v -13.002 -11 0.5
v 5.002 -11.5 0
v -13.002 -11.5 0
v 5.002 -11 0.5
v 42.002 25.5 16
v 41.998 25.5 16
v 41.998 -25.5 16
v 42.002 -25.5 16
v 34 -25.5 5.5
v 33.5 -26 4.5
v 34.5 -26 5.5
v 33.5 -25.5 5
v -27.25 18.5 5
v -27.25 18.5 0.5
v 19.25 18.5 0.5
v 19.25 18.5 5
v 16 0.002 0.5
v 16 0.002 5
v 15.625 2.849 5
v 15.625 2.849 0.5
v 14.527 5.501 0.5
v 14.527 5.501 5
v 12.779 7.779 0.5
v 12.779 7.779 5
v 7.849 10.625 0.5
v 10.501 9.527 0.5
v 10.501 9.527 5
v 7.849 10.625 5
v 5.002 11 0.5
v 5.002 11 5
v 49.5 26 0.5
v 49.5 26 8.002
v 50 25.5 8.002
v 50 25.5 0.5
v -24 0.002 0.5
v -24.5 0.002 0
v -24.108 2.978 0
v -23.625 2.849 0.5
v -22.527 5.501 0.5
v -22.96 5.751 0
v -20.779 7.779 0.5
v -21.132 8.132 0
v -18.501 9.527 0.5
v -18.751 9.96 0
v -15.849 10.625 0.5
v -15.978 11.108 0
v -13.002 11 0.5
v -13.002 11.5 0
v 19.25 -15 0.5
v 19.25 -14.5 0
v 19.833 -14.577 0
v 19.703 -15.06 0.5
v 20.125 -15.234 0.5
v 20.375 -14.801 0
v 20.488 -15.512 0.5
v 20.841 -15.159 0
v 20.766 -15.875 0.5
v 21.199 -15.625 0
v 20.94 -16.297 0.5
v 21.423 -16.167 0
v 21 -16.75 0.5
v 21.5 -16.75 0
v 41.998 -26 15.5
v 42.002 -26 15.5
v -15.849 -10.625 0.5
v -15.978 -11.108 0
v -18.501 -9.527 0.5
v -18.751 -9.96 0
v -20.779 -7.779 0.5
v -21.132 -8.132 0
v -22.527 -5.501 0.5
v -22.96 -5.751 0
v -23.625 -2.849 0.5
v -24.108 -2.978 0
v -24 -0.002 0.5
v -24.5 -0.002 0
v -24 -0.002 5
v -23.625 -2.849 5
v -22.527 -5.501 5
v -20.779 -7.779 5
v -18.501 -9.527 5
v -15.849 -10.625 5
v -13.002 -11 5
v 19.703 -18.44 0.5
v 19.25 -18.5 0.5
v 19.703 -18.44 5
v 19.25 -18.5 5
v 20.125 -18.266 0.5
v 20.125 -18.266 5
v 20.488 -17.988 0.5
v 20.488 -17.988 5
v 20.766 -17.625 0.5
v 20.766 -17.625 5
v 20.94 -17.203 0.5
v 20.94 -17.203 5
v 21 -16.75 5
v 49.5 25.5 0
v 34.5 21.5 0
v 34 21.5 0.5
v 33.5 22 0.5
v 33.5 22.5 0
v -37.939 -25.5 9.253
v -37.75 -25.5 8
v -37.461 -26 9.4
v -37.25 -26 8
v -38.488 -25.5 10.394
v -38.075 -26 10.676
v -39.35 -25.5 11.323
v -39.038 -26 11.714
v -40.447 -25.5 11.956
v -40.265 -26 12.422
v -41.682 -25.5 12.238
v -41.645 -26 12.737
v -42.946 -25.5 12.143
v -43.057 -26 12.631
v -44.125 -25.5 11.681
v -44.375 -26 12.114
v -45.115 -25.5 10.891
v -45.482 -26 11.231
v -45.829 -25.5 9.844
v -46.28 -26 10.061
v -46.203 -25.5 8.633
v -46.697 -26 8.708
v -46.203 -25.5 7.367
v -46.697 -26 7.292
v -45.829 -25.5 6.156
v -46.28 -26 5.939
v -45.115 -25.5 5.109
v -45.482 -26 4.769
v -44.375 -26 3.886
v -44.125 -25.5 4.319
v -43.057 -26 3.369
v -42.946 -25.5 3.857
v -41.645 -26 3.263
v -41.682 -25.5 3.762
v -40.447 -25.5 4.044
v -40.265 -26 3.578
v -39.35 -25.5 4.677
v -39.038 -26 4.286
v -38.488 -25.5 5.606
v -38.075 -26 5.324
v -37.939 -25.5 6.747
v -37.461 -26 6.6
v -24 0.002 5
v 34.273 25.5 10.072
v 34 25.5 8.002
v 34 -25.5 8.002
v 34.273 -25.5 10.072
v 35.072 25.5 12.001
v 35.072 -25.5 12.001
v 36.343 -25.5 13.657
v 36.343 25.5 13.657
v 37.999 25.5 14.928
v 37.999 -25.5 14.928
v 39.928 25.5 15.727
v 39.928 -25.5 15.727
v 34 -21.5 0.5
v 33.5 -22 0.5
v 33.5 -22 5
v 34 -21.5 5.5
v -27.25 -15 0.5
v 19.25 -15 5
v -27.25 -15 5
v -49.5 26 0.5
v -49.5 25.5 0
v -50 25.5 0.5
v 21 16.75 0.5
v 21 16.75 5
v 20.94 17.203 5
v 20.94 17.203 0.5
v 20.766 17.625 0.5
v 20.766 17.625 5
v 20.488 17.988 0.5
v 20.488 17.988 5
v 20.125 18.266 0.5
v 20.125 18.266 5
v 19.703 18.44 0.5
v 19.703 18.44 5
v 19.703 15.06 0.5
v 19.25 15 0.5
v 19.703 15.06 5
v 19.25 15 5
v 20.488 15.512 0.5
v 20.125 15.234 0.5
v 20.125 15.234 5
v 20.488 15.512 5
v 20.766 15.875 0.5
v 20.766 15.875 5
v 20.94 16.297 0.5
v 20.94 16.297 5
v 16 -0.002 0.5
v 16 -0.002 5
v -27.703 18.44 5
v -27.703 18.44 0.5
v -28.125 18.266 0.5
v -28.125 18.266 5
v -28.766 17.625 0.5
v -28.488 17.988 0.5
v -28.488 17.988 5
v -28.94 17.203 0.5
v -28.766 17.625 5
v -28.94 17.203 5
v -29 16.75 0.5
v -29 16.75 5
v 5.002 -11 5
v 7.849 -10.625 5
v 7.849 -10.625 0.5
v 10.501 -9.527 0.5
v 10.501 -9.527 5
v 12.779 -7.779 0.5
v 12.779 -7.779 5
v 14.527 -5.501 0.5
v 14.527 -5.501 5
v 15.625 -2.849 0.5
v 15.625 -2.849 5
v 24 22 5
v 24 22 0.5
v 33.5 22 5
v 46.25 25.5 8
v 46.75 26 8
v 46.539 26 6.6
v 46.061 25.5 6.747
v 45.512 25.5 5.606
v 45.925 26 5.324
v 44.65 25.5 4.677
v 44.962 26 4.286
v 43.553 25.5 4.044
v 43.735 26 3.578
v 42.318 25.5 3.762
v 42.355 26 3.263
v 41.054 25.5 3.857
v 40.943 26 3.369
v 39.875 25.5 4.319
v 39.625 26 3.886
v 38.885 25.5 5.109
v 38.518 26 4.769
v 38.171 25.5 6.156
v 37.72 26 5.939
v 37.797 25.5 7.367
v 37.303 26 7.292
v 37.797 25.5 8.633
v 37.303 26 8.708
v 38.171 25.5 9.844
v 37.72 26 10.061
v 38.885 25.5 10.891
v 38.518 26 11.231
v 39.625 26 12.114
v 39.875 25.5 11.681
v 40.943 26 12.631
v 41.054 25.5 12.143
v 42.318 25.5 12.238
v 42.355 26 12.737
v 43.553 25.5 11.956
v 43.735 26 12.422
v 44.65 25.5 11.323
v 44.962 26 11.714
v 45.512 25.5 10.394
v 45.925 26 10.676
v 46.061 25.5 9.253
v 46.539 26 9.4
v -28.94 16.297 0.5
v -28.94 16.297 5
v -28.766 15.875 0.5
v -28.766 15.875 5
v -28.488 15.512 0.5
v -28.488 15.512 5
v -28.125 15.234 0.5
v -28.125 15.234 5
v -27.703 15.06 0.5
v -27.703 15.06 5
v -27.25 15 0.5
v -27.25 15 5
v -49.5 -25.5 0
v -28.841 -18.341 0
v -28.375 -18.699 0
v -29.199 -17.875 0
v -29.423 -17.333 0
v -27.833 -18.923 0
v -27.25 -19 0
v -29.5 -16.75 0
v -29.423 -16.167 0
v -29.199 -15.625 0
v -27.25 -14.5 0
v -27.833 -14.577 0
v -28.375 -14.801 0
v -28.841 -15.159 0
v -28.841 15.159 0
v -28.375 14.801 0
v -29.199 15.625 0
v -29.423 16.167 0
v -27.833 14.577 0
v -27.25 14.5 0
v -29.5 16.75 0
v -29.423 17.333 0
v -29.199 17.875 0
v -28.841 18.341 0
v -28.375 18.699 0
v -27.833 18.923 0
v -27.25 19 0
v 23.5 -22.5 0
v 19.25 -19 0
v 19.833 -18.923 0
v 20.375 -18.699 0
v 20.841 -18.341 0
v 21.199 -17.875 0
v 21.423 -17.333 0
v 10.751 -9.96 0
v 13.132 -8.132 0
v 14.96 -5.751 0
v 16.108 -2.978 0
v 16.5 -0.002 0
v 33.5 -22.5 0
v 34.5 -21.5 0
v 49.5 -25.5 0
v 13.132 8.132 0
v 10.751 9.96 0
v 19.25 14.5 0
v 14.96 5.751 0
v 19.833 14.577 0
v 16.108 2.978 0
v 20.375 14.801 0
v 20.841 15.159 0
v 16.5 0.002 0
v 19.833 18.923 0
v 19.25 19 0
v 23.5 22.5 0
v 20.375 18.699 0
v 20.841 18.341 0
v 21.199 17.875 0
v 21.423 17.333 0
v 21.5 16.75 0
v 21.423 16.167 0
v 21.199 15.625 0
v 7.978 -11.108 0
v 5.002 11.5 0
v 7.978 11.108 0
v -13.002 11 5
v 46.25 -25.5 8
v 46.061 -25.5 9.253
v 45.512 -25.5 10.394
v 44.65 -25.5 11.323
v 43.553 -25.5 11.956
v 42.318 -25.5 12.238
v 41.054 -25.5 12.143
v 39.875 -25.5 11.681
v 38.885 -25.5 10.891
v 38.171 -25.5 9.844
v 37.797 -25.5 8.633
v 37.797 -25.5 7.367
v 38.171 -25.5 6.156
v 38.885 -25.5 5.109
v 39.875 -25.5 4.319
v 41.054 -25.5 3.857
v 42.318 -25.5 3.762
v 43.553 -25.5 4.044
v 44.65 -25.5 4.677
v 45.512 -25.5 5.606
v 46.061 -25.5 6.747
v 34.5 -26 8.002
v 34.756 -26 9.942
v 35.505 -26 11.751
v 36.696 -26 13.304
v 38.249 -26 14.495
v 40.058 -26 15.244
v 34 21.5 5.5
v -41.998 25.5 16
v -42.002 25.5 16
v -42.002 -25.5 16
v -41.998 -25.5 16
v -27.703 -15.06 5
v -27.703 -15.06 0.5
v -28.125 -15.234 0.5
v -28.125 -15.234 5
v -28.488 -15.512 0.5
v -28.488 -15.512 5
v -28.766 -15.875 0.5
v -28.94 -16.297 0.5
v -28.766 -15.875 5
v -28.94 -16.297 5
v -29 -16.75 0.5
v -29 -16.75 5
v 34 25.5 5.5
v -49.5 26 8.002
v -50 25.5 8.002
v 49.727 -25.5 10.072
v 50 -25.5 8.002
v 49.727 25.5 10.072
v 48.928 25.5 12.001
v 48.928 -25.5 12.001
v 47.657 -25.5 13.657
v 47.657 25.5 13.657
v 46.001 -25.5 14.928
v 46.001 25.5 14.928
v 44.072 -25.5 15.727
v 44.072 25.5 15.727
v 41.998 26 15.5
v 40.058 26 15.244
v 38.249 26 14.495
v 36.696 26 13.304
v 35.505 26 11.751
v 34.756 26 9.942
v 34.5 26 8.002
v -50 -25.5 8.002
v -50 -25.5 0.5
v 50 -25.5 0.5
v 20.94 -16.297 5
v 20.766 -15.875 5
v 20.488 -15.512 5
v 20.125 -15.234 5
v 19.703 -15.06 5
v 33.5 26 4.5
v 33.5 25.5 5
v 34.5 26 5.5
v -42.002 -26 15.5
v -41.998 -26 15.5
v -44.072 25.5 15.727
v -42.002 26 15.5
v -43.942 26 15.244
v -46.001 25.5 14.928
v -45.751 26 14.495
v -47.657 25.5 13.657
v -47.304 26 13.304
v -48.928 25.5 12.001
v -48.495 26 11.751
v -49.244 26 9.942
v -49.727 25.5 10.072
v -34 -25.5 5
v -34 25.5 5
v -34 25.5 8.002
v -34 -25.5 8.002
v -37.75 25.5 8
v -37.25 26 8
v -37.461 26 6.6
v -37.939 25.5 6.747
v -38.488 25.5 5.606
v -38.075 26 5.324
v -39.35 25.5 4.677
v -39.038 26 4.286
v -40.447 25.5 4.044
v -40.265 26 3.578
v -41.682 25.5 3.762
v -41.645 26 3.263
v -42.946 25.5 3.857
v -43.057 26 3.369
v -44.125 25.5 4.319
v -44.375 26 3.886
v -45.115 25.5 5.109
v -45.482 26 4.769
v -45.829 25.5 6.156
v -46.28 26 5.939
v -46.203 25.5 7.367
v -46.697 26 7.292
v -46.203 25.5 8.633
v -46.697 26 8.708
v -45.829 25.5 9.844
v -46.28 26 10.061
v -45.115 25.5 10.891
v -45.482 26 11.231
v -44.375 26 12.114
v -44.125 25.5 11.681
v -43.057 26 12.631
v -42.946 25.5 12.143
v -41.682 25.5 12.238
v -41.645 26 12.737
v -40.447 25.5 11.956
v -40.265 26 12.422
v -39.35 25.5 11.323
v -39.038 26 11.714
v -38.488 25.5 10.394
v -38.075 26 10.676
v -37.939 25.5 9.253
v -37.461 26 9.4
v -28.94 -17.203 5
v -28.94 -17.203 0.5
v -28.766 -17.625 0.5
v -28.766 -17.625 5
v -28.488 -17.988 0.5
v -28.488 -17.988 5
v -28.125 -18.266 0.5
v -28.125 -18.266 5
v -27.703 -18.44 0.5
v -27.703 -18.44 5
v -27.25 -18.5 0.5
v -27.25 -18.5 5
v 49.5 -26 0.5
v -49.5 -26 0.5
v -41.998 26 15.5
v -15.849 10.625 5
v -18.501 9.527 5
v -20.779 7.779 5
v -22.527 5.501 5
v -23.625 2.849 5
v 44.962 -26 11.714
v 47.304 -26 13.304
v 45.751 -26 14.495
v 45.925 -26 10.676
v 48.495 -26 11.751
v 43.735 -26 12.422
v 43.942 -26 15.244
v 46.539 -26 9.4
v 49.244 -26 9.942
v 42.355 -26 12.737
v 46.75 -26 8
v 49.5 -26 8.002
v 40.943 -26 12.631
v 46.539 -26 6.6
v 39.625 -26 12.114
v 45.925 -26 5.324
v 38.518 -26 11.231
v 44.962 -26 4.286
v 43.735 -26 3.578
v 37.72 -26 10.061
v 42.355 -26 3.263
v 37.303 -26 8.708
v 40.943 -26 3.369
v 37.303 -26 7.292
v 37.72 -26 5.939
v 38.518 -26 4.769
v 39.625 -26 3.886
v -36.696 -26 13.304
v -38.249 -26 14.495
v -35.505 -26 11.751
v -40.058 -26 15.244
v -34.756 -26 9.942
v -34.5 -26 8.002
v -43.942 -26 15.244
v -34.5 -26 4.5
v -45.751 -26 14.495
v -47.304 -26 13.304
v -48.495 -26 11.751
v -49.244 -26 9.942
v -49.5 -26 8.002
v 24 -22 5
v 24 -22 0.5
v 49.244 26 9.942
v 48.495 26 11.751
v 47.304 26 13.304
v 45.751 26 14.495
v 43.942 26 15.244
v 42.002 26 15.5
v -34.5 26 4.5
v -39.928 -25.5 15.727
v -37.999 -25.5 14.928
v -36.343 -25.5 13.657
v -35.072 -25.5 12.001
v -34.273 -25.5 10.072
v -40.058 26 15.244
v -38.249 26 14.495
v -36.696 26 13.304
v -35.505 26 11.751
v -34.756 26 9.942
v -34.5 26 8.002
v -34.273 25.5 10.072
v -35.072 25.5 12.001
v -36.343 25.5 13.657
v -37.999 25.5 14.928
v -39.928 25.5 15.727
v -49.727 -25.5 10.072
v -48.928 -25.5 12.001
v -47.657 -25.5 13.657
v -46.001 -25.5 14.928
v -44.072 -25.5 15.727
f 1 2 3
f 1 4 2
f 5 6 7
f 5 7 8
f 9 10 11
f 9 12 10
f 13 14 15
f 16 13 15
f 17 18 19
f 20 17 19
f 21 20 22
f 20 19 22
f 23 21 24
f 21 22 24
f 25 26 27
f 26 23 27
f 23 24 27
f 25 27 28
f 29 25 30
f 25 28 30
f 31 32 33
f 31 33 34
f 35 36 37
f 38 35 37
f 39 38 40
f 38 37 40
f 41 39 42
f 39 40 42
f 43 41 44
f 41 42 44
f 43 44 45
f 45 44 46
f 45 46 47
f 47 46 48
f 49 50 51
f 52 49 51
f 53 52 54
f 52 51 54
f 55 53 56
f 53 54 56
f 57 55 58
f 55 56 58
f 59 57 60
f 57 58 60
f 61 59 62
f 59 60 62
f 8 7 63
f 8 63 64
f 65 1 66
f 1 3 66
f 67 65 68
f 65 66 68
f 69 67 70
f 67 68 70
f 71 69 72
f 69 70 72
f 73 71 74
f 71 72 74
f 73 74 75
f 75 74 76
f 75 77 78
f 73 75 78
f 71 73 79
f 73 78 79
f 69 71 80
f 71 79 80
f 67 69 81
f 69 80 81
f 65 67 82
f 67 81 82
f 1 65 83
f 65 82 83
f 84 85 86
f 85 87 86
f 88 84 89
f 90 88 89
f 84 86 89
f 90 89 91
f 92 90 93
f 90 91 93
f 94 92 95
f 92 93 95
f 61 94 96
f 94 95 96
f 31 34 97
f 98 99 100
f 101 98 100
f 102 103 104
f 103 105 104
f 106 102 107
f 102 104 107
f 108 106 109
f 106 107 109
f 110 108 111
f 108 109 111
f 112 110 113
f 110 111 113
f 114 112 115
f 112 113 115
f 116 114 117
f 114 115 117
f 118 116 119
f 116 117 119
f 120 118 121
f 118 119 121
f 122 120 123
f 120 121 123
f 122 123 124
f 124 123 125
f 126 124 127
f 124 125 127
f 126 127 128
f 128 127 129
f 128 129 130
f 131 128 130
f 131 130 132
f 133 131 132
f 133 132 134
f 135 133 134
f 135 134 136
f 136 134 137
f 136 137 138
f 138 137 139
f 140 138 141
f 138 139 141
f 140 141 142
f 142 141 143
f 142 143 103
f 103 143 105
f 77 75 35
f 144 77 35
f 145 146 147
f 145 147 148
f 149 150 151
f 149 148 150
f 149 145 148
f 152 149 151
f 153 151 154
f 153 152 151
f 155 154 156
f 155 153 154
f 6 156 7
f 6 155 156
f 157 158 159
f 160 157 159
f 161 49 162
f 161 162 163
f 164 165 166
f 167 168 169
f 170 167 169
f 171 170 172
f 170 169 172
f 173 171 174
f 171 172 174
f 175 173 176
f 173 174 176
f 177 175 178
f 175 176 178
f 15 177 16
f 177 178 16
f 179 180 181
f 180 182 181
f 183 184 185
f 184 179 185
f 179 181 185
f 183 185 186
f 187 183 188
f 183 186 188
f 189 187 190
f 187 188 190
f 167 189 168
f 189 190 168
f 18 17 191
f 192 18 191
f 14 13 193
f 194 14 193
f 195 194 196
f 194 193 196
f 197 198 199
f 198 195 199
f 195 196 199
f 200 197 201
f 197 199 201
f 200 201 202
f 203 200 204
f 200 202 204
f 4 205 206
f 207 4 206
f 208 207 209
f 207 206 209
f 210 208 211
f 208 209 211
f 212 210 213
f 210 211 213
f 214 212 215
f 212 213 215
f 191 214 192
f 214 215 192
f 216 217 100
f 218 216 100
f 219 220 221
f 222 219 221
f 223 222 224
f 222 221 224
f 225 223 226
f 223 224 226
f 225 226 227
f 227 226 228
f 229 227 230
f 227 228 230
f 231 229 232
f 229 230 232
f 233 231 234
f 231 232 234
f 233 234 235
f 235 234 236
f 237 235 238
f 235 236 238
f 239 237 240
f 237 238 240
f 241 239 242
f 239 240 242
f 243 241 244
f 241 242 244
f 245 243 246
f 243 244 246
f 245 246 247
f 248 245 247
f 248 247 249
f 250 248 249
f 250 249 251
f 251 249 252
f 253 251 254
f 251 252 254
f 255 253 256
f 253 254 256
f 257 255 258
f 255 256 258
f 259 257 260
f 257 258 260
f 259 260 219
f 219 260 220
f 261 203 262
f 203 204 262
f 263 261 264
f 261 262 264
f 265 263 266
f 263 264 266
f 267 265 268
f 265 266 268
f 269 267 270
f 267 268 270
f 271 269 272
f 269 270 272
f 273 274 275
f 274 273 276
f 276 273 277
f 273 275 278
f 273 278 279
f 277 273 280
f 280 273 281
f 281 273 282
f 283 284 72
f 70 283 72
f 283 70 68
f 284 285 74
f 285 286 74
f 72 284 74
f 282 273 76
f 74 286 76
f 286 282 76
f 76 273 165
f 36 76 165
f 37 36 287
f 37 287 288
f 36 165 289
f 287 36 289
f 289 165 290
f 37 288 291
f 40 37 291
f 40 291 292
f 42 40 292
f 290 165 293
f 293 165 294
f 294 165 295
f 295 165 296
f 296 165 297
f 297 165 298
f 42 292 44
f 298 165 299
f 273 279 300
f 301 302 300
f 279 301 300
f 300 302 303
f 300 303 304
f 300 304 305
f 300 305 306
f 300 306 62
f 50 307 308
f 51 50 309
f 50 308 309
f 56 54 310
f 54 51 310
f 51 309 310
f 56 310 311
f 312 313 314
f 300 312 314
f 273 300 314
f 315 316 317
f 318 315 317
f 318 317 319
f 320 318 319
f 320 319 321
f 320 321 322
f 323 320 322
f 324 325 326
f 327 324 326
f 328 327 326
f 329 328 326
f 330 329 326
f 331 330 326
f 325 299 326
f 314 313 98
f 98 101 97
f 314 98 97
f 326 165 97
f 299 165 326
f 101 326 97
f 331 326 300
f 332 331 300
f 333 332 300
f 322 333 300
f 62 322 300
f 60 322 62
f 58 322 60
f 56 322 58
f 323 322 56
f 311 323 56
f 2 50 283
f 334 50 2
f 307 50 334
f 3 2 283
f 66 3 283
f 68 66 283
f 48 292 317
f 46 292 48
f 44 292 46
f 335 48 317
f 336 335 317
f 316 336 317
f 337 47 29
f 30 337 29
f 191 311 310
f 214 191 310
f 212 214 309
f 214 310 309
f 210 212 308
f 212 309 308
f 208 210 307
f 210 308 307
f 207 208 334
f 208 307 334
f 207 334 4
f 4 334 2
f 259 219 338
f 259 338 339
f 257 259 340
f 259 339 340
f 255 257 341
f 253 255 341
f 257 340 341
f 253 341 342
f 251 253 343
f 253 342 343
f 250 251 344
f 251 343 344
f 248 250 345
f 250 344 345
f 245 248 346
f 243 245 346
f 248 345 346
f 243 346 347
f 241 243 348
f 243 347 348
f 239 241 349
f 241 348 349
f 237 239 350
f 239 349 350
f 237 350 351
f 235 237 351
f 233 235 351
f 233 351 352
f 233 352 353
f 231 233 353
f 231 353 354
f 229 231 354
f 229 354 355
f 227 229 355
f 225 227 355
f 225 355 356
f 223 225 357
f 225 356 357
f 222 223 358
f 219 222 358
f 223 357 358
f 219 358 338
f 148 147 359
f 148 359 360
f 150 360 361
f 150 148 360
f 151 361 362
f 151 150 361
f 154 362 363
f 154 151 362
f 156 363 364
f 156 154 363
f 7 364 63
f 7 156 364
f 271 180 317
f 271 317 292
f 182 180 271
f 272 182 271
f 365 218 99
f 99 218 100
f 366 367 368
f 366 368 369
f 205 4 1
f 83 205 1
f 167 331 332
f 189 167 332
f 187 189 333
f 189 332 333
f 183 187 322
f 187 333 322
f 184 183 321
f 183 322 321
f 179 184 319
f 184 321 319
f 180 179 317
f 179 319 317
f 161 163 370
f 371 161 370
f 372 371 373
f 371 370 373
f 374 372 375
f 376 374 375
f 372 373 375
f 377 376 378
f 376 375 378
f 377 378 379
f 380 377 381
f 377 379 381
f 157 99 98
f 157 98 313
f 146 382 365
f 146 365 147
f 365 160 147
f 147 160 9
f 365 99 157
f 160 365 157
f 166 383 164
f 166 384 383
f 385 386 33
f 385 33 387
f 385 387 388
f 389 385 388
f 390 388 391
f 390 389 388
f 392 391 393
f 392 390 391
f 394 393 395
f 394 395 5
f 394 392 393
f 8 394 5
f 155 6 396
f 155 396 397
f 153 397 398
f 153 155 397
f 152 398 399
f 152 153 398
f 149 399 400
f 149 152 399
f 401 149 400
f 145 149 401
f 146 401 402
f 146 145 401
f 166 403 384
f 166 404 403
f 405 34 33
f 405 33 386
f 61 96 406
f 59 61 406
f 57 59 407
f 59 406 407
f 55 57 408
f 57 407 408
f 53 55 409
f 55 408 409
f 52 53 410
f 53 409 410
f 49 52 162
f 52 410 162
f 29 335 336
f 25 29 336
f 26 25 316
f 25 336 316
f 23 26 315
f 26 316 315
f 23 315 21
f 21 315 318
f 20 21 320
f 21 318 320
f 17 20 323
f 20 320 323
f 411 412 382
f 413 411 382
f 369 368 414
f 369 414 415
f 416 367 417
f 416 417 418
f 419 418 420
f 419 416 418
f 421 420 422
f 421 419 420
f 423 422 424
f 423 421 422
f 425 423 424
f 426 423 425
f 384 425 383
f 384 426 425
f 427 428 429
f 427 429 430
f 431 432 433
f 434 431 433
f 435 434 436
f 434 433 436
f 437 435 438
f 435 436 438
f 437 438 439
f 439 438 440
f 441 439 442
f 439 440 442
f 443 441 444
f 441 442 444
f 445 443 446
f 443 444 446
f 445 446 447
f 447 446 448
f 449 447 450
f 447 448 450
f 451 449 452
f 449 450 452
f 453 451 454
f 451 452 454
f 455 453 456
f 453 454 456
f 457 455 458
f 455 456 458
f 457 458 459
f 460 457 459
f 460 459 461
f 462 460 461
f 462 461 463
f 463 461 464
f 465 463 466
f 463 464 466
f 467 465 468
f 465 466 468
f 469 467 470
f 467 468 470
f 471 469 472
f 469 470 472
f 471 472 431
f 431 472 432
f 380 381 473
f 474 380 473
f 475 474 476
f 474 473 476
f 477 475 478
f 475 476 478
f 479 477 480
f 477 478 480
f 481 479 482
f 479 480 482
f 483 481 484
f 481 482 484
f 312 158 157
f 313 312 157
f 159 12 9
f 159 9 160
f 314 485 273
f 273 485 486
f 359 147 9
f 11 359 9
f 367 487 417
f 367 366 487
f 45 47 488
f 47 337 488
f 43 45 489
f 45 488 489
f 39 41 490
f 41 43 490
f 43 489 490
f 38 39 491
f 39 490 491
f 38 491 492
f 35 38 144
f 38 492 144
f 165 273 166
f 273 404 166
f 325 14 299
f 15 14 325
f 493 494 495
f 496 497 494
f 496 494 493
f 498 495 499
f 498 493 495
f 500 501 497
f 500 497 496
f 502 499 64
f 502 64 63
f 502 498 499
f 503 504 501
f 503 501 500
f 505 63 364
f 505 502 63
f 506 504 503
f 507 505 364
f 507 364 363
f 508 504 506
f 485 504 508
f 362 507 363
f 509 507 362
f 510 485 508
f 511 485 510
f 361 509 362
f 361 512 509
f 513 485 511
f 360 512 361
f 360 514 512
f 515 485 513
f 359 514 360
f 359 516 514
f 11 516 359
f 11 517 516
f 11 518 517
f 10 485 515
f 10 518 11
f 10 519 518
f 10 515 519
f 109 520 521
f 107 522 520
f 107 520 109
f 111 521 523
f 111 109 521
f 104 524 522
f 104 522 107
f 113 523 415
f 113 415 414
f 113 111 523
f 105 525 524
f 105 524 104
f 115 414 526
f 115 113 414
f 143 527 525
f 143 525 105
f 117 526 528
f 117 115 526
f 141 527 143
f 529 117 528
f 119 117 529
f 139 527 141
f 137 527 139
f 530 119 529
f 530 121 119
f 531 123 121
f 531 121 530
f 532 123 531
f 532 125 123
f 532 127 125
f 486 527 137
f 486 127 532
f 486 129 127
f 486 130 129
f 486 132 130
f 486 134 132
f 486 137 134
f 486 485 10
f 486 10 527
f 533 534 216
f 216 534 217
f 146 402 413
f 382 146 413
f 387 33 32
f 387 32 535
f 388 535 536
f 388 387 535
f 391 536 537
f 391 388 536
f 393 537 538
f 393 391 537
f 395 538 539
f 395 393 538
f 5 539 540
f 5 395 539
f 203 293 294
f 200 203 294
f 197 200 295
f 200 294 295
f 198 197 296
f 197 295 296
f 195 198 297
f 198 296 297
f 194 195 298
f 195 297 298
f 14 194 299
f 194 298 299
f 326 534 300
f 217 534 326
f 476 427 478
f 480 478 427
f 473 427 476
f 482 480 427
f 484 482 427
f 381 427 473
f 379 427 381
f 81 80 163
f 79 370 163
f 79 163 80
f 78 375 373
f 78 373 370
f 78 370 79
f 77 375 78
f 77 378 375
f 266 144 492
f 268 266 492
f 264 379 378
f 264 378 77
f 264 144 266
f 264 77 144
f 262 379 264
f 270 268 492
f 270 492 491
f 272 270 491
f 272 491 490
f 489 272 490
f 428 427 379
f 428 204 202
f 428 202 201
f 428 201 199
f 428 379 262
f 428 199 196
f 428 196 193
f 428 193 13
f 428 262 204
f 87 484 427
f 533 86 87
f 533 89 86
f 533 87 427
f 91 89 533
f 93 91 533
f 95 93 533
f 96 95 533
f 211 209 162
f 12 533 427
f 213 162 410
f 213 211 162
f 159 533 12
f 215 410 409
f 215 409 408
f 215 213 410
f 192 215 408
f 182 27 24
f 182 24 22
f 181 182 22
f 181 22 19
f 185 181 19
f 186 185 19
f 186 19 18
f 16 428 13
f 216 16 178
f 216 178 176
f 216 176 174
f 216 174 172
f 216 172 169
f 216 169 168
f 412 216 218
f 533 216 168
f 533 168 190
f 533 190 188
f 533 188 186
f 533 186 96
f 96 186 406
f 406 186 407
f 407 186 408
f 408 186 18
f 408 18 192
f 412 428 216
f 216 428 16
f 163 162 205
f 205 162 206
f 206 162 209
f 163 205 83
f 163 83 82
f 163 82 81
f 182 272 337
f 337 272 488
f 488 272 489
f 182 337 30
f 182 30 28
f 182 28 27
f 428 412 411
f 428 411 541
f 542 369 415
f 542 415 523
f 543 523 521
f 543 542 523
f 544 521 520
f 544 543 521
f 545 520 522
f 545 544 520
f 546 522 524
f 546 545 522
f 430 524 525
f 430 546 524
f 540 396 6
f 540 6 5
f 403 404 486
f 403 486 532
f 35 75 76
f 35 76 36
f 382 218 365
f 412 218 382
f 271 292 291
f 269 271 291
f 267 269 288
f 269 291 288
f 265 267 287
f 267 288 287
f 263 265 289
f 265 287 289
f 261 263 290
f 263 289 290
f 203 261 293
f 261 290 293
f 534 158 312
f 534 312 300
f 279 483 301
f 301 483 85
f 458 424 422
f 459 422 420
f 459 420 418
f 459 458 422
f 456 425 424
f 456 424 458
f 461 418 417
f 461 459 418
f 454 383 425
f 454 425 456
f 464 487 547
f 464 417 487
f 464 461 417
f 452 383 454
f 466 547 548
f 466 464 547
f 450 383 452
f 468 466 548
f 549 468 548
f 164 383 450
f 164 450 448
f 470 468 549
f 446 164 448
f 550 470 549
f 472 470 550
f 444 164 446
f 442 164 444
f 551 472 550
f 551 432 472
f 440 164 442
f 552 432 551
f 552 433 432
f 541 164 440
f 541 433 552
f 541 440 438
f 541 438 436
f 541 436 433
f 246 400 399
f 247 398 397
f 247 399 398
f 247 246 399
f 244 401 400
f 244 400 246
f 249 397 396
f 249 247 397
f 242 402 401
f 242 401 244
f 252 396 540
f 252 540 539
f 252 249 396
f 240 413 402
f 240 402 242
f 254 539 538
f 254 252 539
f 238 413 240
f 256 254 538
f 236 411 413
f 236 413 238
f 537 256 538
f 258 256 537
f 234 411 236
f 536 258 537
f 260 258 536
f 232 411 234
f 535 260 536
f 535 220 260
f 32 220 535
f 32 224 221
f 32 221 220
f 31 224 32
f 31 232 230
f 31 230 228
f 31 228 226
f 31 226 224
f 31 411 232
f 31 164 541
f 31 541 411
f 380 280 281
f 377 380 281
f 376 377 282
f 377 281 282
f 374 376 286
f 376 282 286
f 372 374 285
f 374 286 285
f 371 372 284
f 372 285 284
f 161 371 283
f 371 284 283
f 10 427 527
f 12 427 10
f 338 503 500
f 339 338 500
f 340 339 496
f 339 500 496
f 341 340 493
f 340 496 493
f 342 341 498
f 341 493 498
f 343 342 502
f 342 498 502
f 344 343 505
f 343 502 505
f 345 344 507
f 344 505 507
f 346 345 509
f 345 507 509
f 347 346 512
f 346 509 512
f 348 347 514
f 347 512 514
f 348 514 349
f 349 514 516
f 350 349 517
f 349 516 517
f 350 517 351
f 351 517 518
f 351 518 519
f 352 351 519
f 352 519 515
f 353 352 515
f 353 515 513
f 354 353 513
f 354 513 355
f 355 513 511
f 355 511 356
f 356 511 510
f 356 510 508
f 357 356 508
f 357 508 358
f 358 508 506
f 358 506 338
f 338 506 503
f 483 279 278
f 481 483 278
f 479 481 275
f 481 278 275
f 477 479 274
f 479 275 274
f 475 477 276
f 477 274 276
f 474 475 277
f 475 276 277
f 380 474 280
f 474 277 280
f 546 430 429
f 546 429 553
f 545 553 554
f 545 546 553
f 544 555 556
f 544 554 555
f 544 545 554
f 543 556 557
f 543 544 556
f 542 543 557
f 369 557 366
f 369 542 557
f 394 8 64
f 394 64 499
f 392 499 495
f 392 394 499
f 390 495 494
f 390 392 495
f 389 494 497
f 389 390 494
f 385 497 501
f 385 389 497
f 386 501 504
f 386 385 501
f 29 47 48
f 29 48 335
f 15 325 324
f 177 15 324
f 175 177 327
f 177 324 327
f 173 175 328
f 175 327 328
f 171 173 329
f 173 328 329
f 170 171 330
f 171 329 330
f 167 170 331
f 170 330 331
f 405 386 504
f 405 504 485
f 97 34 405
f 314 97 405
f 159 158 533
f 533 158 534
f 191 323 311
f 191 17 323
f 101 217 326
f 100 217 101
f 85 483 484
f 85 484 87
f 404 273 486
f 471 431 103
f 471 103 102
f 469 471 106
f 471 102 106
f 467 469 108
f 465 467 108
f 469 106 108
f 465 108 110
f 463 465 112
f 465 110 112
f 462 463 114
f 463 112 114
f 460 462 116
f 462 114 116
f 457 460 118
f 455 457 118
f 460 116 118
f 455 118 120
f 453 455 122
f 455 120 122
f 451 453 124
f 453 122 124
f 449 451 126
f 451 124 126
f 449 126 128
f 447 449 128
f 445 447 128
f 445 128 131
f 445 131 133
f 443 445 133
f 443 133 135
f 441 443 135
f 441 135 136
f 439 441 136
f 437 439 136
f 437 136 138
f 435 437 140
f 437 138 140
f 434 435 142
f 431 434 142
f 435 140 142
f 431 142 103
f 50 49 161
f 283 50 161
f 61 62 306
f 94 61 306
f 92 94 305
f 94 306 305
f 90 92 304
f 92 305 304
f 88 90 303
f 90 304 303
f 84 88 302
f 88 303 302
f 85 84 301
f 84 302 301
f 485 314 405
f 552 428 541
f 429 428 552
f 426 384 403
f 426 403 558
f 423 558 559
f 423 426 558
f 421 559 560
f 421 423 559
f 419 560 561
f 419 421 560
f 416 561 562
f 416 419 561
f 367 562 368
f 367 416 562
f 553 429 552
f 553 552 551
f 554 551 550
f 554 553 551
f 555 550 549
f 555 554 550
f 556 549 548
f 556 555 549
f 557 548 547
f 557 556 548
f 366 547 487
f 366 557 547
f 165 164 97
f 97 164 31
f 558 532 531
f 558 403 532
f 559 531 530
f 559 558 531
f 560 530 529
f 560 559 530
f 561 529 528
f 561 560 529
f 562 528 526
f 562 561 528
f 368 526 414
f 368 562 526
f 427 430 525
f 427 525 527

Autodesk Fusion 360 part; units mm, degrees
sketch "Sketch1" plane through (0, 0, 0) normal (0, 0, 1) x (1, 0, 0)
  line L0 (50, -26) -> (-50, -26)
  line L1 (-50, -26) -> (-50, 26)
  line L2 (-50, 26) -> (50, 26)
  line L3 (50, 26) -> (50, -26)
  line L4 (50, -26) -> (-50, 26) construction
  line L5 (-50, -26) -> (50, 26) construction
  line L6 (-34, 26) -> (-34, -26)
  line L7 (34, 26) -> (34, -26)
  line L8 (24, 22) -> (34, 22)
  line L9 (34, 22) -> (34, -22)
  line L10 (34, -22) -> (24, -22)
  line L11 (24, -22) -> (24, 22)
  line L12 (-24, 11) -> (16, 11)
  line L13 (16, 11) -> (16, -11)
  line L14 (16, -11) -> (-24, -11)
  line L15 (-24, -11) -> (-24, 11)
  line L16 (50, 0) -> (-34, 0) construction
  line L17 (-29, 18.5) -> (21, 18.5)
  line L18 (21, 18.5) -> (21, 15)
  line L19 (21, 15) -> (-29, 15)
  line L20 (-29, 15) -> (-29, 18.5)
  line L21 (-4, -11) -> (-4, 41) construction
  line L22 (-29, -18.5) -> (21, -18.5)
  line L23 (21, -15) -> (-29, -15)
  line L24 (-29, -15) -> (-29, -18.5)
  line L25 (21, -18.5) -> (21, -15)
  dimension "d15" = 52
  dimension "d16" = 16
  dimension "d17" = 16
  dimension "d18" = 10
  dimension "d19" = 44
  dimension "d22" = 100
  dimension "d23" = 10
  dimension "d24" = 40
  dimension "d25" = 22
  dimension "d26" = 11
  dimension "d27" = 3.5
  dimension "d28" = 4
  dimension "d29" = 50
extrude "Extrude1" add sketch "Sketch1" along normal blind 5 contours L0 L2 L3 L7 L9 | L0 L2 L6 L7 L8 L10 L11 | L0 L1 L2 L6
extrude "Extrude2" add sketch "Sketch1" along normal blind 16 contours L0 L2 L3 L7 L9 | L0 L1 L2 L6
fillet "Fillet1" radius 11 4 edges at (-24, -11, 2.5) (16, -11, 2.5) (16, 11, 2.5) (-24, 11, 2.5)
fillet "Fillet2" radius 8 4 edges at (-50, 0, 16) (-34, 0, 16) (34, 0, 16) (50, 0, 16)
fillet "Fillet3" radius 1.75 8 edges at (-29, 18.5, 2.5) (-29, -15, 2.5) (21, 18.5, 2.5) (21, -15, 2.5) (21, -18.5, 2.5) (21, 15, 2.5) (-29, -18.5, 2.5) (-29, 15, 2.5)
sketch "Sketch2" plane through (0, -26, 0) normal (0, -1, 0) x (1, 0, 0)
  arc A0 (50, 8) -> (34, 8) centre (42, 8) ccw
  line L0 (34, 8) -> (34, 5)
  line L1 (34, 5) -> (-34, 5)
  line L2 (-34, 5) -> (-34, 8)
  arc A1 (-34, 8) -> (-50, 8) centre (-42, 8) ccw
  line L3 (-50, 8) -> (-50, 0)
  line L4 (-50, 0) -> (50, 0)
  line L5 (50, 0) -> (50, 8)
  circle A2 centre (-42, 8) radius 4.25
  circle A3 centre (42, 8) radius 4.25
  dimension "d40" = 8.5
  dimension "d41" = 8.5
extrude "Extrude3" cut sketch "Sketch2" against normal blind 55 contours A2 | A3
chamfer "Chamfer1" distance 0.5 angle 45 18 edges at (-50, 0, 0) (50, 0, 0) (0, -26, 0) (-45.9624, -26, 9.5369) (38.0376, -26, 9.5369) (0, 26, 5) (0, -26, 5) (42, -26, 16) (50, -26, 4) (34, -26, 6.5) (-42, -26, 16) (-34, -26, 6.5) (-50, -26, 4) (50, 26, 4) (42, 26, 16) (34, 26, 6.5) (38.0376, 26, 6.4631) (-45.9624, 26, 6.4631) 5 faces at (50, -8.6667, 5.3344) (42.7619, -8.6667, 15.9638) (34, 7.3333, 1.6667) (-41.3333, 0.0007, 0) (-11.3333, 26, 1.6667)
equation "d26 = d25 / 2"
equation "d40 = draadstang"
equation "d41 = d40"
equation "draadstang = 8.5 mm"
